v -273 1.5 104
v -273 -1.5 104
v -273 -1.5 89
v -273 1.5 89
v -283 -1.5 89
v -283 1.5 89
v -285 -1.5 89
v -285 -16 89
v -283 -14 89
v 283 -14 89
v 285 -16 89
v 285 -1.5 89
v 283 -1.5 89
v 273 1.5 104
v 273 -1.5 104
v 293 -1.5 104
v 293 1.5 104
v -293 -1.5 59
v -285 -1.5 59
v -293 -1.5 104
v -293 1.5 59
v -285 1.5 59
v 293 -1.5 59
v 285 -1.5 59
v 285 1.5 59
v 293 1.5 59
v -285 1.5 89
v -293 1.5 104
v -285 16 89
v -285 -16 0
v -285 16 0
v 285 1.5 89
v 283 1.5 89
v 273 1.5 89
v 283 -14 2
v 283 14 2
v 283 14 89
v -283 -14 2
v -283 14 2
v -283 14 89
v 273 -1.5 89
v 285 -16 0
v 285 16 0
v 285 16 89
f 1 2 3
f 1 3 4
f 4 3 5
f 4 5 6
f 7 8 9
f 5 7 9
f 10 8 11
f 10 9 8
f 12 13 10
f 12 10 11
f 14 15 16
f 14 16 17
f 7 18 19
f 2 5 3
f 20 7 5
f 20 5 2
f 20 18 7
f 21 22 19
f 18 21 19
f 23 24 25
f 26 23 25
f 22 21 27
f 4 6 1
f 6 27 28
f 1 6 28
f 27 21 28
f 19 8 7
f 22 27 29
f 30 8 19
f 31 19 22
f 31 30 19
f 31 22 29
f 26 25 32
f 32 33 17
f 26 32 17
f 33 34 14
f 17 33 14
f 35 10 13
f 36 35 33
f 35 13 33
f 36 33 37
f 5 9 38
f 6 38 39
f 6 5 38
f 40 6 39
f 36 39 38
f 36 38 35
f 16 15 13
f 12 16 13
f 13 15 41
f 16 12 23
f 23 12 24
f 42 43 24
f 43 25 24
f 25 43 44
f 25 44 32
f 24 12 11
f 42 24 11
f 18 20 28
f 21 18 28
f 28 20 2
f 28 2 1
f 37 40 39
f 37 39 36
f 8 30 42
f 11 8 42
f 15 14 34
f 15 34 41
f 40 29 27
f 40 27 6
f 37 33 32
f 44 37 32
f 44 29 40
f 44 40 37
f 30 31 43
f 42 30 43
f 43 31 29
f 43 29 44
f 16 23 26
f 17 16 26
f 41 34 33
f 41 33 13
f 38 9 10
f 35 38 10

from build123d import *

# Parameters (mm, degrees)
F0_W      = 570
F0_H      = 32
F1_DEPTH  = 89
F2_W      = 3
F2_H      = 30
F3_DEPTH  = 8
F4_W      = 8
F4_H      = 3
F5_DEPTH  = 15
F6_W      = 566
F6_H      = 28
F7_DEPTH  = 87
F8_W      = 3
F8_H      = 15
F9_DEPTH  = 12
F10_W     = 3
F10_H     = 30
F10_H_2   = 15
F11_DEPTH = 8
F12_W     = 3
F12_H     = 15
F13_DEPTH = 12


with BuildPart() as f1:
    # F0 (on Top) → F1 (new body)
    with BuildSketch(Plane.XY):
        Rectangle(F0_W, F0_H)
    extrude(amount=F1_DEPTH)

    # F2 (on face) → F3 (join)
    with BuildSketch(Plane(origin=(-285, 0, 0), x_dir=(0, -1, 0), z_dir=(-1, 0, 0))):
        with Locations((0, 74)):
            Rectangle(F2_W, F2_H)
    extrude(amount=F3_DEPTH)

    # F4 (on face) → F5 (join)
    with BuildSketch(Plane.XY.offset(89)):
        with Locations((-289, 0)):
            Rectangle(F4_W, F4_H)
    extrude(amount=F5_DEPTH)

    # F6 (on face) → F7 (cut)
    with BuildSketch(Plane.XY.offset(89)):
        Rectangle(F6_W, F6_H)
    extrude(amount=-F7_DEPTH, mode=Mode.SUBTRACT)

    # F8 (on face) → F9 (join)
    with BuildSketch(Plane(origin=(285, 0, 0), x_dir=(0, -1, 0), z_dir=(-1, 0, 0))):
        with Locations((0, 96.5)):
            Rectangle(F8_W, F8_H)
    extrude(amount=F9_DEPTH)

    # F10 (on face) → F11 (join)
    with BuildSketch(Plane.YZ.offset(285)):
        with Locations((0, 74)):
            Rectangle(F10_W, F10_H)
        with Locations((0, 96.5)):
            Rectangle(F10_W, F10_H_2)
    extrude(amount=F11_DEPTH)

    # F12 (on face) → F13 (join)
    with BuildSketch(Plane.YZ.offset(-285)):
        with Locations((0, 96.5)):
            Rectangle(F12_W, F12_H)
    extrude(amount=F13_DEPTH)


solid = f1.part
